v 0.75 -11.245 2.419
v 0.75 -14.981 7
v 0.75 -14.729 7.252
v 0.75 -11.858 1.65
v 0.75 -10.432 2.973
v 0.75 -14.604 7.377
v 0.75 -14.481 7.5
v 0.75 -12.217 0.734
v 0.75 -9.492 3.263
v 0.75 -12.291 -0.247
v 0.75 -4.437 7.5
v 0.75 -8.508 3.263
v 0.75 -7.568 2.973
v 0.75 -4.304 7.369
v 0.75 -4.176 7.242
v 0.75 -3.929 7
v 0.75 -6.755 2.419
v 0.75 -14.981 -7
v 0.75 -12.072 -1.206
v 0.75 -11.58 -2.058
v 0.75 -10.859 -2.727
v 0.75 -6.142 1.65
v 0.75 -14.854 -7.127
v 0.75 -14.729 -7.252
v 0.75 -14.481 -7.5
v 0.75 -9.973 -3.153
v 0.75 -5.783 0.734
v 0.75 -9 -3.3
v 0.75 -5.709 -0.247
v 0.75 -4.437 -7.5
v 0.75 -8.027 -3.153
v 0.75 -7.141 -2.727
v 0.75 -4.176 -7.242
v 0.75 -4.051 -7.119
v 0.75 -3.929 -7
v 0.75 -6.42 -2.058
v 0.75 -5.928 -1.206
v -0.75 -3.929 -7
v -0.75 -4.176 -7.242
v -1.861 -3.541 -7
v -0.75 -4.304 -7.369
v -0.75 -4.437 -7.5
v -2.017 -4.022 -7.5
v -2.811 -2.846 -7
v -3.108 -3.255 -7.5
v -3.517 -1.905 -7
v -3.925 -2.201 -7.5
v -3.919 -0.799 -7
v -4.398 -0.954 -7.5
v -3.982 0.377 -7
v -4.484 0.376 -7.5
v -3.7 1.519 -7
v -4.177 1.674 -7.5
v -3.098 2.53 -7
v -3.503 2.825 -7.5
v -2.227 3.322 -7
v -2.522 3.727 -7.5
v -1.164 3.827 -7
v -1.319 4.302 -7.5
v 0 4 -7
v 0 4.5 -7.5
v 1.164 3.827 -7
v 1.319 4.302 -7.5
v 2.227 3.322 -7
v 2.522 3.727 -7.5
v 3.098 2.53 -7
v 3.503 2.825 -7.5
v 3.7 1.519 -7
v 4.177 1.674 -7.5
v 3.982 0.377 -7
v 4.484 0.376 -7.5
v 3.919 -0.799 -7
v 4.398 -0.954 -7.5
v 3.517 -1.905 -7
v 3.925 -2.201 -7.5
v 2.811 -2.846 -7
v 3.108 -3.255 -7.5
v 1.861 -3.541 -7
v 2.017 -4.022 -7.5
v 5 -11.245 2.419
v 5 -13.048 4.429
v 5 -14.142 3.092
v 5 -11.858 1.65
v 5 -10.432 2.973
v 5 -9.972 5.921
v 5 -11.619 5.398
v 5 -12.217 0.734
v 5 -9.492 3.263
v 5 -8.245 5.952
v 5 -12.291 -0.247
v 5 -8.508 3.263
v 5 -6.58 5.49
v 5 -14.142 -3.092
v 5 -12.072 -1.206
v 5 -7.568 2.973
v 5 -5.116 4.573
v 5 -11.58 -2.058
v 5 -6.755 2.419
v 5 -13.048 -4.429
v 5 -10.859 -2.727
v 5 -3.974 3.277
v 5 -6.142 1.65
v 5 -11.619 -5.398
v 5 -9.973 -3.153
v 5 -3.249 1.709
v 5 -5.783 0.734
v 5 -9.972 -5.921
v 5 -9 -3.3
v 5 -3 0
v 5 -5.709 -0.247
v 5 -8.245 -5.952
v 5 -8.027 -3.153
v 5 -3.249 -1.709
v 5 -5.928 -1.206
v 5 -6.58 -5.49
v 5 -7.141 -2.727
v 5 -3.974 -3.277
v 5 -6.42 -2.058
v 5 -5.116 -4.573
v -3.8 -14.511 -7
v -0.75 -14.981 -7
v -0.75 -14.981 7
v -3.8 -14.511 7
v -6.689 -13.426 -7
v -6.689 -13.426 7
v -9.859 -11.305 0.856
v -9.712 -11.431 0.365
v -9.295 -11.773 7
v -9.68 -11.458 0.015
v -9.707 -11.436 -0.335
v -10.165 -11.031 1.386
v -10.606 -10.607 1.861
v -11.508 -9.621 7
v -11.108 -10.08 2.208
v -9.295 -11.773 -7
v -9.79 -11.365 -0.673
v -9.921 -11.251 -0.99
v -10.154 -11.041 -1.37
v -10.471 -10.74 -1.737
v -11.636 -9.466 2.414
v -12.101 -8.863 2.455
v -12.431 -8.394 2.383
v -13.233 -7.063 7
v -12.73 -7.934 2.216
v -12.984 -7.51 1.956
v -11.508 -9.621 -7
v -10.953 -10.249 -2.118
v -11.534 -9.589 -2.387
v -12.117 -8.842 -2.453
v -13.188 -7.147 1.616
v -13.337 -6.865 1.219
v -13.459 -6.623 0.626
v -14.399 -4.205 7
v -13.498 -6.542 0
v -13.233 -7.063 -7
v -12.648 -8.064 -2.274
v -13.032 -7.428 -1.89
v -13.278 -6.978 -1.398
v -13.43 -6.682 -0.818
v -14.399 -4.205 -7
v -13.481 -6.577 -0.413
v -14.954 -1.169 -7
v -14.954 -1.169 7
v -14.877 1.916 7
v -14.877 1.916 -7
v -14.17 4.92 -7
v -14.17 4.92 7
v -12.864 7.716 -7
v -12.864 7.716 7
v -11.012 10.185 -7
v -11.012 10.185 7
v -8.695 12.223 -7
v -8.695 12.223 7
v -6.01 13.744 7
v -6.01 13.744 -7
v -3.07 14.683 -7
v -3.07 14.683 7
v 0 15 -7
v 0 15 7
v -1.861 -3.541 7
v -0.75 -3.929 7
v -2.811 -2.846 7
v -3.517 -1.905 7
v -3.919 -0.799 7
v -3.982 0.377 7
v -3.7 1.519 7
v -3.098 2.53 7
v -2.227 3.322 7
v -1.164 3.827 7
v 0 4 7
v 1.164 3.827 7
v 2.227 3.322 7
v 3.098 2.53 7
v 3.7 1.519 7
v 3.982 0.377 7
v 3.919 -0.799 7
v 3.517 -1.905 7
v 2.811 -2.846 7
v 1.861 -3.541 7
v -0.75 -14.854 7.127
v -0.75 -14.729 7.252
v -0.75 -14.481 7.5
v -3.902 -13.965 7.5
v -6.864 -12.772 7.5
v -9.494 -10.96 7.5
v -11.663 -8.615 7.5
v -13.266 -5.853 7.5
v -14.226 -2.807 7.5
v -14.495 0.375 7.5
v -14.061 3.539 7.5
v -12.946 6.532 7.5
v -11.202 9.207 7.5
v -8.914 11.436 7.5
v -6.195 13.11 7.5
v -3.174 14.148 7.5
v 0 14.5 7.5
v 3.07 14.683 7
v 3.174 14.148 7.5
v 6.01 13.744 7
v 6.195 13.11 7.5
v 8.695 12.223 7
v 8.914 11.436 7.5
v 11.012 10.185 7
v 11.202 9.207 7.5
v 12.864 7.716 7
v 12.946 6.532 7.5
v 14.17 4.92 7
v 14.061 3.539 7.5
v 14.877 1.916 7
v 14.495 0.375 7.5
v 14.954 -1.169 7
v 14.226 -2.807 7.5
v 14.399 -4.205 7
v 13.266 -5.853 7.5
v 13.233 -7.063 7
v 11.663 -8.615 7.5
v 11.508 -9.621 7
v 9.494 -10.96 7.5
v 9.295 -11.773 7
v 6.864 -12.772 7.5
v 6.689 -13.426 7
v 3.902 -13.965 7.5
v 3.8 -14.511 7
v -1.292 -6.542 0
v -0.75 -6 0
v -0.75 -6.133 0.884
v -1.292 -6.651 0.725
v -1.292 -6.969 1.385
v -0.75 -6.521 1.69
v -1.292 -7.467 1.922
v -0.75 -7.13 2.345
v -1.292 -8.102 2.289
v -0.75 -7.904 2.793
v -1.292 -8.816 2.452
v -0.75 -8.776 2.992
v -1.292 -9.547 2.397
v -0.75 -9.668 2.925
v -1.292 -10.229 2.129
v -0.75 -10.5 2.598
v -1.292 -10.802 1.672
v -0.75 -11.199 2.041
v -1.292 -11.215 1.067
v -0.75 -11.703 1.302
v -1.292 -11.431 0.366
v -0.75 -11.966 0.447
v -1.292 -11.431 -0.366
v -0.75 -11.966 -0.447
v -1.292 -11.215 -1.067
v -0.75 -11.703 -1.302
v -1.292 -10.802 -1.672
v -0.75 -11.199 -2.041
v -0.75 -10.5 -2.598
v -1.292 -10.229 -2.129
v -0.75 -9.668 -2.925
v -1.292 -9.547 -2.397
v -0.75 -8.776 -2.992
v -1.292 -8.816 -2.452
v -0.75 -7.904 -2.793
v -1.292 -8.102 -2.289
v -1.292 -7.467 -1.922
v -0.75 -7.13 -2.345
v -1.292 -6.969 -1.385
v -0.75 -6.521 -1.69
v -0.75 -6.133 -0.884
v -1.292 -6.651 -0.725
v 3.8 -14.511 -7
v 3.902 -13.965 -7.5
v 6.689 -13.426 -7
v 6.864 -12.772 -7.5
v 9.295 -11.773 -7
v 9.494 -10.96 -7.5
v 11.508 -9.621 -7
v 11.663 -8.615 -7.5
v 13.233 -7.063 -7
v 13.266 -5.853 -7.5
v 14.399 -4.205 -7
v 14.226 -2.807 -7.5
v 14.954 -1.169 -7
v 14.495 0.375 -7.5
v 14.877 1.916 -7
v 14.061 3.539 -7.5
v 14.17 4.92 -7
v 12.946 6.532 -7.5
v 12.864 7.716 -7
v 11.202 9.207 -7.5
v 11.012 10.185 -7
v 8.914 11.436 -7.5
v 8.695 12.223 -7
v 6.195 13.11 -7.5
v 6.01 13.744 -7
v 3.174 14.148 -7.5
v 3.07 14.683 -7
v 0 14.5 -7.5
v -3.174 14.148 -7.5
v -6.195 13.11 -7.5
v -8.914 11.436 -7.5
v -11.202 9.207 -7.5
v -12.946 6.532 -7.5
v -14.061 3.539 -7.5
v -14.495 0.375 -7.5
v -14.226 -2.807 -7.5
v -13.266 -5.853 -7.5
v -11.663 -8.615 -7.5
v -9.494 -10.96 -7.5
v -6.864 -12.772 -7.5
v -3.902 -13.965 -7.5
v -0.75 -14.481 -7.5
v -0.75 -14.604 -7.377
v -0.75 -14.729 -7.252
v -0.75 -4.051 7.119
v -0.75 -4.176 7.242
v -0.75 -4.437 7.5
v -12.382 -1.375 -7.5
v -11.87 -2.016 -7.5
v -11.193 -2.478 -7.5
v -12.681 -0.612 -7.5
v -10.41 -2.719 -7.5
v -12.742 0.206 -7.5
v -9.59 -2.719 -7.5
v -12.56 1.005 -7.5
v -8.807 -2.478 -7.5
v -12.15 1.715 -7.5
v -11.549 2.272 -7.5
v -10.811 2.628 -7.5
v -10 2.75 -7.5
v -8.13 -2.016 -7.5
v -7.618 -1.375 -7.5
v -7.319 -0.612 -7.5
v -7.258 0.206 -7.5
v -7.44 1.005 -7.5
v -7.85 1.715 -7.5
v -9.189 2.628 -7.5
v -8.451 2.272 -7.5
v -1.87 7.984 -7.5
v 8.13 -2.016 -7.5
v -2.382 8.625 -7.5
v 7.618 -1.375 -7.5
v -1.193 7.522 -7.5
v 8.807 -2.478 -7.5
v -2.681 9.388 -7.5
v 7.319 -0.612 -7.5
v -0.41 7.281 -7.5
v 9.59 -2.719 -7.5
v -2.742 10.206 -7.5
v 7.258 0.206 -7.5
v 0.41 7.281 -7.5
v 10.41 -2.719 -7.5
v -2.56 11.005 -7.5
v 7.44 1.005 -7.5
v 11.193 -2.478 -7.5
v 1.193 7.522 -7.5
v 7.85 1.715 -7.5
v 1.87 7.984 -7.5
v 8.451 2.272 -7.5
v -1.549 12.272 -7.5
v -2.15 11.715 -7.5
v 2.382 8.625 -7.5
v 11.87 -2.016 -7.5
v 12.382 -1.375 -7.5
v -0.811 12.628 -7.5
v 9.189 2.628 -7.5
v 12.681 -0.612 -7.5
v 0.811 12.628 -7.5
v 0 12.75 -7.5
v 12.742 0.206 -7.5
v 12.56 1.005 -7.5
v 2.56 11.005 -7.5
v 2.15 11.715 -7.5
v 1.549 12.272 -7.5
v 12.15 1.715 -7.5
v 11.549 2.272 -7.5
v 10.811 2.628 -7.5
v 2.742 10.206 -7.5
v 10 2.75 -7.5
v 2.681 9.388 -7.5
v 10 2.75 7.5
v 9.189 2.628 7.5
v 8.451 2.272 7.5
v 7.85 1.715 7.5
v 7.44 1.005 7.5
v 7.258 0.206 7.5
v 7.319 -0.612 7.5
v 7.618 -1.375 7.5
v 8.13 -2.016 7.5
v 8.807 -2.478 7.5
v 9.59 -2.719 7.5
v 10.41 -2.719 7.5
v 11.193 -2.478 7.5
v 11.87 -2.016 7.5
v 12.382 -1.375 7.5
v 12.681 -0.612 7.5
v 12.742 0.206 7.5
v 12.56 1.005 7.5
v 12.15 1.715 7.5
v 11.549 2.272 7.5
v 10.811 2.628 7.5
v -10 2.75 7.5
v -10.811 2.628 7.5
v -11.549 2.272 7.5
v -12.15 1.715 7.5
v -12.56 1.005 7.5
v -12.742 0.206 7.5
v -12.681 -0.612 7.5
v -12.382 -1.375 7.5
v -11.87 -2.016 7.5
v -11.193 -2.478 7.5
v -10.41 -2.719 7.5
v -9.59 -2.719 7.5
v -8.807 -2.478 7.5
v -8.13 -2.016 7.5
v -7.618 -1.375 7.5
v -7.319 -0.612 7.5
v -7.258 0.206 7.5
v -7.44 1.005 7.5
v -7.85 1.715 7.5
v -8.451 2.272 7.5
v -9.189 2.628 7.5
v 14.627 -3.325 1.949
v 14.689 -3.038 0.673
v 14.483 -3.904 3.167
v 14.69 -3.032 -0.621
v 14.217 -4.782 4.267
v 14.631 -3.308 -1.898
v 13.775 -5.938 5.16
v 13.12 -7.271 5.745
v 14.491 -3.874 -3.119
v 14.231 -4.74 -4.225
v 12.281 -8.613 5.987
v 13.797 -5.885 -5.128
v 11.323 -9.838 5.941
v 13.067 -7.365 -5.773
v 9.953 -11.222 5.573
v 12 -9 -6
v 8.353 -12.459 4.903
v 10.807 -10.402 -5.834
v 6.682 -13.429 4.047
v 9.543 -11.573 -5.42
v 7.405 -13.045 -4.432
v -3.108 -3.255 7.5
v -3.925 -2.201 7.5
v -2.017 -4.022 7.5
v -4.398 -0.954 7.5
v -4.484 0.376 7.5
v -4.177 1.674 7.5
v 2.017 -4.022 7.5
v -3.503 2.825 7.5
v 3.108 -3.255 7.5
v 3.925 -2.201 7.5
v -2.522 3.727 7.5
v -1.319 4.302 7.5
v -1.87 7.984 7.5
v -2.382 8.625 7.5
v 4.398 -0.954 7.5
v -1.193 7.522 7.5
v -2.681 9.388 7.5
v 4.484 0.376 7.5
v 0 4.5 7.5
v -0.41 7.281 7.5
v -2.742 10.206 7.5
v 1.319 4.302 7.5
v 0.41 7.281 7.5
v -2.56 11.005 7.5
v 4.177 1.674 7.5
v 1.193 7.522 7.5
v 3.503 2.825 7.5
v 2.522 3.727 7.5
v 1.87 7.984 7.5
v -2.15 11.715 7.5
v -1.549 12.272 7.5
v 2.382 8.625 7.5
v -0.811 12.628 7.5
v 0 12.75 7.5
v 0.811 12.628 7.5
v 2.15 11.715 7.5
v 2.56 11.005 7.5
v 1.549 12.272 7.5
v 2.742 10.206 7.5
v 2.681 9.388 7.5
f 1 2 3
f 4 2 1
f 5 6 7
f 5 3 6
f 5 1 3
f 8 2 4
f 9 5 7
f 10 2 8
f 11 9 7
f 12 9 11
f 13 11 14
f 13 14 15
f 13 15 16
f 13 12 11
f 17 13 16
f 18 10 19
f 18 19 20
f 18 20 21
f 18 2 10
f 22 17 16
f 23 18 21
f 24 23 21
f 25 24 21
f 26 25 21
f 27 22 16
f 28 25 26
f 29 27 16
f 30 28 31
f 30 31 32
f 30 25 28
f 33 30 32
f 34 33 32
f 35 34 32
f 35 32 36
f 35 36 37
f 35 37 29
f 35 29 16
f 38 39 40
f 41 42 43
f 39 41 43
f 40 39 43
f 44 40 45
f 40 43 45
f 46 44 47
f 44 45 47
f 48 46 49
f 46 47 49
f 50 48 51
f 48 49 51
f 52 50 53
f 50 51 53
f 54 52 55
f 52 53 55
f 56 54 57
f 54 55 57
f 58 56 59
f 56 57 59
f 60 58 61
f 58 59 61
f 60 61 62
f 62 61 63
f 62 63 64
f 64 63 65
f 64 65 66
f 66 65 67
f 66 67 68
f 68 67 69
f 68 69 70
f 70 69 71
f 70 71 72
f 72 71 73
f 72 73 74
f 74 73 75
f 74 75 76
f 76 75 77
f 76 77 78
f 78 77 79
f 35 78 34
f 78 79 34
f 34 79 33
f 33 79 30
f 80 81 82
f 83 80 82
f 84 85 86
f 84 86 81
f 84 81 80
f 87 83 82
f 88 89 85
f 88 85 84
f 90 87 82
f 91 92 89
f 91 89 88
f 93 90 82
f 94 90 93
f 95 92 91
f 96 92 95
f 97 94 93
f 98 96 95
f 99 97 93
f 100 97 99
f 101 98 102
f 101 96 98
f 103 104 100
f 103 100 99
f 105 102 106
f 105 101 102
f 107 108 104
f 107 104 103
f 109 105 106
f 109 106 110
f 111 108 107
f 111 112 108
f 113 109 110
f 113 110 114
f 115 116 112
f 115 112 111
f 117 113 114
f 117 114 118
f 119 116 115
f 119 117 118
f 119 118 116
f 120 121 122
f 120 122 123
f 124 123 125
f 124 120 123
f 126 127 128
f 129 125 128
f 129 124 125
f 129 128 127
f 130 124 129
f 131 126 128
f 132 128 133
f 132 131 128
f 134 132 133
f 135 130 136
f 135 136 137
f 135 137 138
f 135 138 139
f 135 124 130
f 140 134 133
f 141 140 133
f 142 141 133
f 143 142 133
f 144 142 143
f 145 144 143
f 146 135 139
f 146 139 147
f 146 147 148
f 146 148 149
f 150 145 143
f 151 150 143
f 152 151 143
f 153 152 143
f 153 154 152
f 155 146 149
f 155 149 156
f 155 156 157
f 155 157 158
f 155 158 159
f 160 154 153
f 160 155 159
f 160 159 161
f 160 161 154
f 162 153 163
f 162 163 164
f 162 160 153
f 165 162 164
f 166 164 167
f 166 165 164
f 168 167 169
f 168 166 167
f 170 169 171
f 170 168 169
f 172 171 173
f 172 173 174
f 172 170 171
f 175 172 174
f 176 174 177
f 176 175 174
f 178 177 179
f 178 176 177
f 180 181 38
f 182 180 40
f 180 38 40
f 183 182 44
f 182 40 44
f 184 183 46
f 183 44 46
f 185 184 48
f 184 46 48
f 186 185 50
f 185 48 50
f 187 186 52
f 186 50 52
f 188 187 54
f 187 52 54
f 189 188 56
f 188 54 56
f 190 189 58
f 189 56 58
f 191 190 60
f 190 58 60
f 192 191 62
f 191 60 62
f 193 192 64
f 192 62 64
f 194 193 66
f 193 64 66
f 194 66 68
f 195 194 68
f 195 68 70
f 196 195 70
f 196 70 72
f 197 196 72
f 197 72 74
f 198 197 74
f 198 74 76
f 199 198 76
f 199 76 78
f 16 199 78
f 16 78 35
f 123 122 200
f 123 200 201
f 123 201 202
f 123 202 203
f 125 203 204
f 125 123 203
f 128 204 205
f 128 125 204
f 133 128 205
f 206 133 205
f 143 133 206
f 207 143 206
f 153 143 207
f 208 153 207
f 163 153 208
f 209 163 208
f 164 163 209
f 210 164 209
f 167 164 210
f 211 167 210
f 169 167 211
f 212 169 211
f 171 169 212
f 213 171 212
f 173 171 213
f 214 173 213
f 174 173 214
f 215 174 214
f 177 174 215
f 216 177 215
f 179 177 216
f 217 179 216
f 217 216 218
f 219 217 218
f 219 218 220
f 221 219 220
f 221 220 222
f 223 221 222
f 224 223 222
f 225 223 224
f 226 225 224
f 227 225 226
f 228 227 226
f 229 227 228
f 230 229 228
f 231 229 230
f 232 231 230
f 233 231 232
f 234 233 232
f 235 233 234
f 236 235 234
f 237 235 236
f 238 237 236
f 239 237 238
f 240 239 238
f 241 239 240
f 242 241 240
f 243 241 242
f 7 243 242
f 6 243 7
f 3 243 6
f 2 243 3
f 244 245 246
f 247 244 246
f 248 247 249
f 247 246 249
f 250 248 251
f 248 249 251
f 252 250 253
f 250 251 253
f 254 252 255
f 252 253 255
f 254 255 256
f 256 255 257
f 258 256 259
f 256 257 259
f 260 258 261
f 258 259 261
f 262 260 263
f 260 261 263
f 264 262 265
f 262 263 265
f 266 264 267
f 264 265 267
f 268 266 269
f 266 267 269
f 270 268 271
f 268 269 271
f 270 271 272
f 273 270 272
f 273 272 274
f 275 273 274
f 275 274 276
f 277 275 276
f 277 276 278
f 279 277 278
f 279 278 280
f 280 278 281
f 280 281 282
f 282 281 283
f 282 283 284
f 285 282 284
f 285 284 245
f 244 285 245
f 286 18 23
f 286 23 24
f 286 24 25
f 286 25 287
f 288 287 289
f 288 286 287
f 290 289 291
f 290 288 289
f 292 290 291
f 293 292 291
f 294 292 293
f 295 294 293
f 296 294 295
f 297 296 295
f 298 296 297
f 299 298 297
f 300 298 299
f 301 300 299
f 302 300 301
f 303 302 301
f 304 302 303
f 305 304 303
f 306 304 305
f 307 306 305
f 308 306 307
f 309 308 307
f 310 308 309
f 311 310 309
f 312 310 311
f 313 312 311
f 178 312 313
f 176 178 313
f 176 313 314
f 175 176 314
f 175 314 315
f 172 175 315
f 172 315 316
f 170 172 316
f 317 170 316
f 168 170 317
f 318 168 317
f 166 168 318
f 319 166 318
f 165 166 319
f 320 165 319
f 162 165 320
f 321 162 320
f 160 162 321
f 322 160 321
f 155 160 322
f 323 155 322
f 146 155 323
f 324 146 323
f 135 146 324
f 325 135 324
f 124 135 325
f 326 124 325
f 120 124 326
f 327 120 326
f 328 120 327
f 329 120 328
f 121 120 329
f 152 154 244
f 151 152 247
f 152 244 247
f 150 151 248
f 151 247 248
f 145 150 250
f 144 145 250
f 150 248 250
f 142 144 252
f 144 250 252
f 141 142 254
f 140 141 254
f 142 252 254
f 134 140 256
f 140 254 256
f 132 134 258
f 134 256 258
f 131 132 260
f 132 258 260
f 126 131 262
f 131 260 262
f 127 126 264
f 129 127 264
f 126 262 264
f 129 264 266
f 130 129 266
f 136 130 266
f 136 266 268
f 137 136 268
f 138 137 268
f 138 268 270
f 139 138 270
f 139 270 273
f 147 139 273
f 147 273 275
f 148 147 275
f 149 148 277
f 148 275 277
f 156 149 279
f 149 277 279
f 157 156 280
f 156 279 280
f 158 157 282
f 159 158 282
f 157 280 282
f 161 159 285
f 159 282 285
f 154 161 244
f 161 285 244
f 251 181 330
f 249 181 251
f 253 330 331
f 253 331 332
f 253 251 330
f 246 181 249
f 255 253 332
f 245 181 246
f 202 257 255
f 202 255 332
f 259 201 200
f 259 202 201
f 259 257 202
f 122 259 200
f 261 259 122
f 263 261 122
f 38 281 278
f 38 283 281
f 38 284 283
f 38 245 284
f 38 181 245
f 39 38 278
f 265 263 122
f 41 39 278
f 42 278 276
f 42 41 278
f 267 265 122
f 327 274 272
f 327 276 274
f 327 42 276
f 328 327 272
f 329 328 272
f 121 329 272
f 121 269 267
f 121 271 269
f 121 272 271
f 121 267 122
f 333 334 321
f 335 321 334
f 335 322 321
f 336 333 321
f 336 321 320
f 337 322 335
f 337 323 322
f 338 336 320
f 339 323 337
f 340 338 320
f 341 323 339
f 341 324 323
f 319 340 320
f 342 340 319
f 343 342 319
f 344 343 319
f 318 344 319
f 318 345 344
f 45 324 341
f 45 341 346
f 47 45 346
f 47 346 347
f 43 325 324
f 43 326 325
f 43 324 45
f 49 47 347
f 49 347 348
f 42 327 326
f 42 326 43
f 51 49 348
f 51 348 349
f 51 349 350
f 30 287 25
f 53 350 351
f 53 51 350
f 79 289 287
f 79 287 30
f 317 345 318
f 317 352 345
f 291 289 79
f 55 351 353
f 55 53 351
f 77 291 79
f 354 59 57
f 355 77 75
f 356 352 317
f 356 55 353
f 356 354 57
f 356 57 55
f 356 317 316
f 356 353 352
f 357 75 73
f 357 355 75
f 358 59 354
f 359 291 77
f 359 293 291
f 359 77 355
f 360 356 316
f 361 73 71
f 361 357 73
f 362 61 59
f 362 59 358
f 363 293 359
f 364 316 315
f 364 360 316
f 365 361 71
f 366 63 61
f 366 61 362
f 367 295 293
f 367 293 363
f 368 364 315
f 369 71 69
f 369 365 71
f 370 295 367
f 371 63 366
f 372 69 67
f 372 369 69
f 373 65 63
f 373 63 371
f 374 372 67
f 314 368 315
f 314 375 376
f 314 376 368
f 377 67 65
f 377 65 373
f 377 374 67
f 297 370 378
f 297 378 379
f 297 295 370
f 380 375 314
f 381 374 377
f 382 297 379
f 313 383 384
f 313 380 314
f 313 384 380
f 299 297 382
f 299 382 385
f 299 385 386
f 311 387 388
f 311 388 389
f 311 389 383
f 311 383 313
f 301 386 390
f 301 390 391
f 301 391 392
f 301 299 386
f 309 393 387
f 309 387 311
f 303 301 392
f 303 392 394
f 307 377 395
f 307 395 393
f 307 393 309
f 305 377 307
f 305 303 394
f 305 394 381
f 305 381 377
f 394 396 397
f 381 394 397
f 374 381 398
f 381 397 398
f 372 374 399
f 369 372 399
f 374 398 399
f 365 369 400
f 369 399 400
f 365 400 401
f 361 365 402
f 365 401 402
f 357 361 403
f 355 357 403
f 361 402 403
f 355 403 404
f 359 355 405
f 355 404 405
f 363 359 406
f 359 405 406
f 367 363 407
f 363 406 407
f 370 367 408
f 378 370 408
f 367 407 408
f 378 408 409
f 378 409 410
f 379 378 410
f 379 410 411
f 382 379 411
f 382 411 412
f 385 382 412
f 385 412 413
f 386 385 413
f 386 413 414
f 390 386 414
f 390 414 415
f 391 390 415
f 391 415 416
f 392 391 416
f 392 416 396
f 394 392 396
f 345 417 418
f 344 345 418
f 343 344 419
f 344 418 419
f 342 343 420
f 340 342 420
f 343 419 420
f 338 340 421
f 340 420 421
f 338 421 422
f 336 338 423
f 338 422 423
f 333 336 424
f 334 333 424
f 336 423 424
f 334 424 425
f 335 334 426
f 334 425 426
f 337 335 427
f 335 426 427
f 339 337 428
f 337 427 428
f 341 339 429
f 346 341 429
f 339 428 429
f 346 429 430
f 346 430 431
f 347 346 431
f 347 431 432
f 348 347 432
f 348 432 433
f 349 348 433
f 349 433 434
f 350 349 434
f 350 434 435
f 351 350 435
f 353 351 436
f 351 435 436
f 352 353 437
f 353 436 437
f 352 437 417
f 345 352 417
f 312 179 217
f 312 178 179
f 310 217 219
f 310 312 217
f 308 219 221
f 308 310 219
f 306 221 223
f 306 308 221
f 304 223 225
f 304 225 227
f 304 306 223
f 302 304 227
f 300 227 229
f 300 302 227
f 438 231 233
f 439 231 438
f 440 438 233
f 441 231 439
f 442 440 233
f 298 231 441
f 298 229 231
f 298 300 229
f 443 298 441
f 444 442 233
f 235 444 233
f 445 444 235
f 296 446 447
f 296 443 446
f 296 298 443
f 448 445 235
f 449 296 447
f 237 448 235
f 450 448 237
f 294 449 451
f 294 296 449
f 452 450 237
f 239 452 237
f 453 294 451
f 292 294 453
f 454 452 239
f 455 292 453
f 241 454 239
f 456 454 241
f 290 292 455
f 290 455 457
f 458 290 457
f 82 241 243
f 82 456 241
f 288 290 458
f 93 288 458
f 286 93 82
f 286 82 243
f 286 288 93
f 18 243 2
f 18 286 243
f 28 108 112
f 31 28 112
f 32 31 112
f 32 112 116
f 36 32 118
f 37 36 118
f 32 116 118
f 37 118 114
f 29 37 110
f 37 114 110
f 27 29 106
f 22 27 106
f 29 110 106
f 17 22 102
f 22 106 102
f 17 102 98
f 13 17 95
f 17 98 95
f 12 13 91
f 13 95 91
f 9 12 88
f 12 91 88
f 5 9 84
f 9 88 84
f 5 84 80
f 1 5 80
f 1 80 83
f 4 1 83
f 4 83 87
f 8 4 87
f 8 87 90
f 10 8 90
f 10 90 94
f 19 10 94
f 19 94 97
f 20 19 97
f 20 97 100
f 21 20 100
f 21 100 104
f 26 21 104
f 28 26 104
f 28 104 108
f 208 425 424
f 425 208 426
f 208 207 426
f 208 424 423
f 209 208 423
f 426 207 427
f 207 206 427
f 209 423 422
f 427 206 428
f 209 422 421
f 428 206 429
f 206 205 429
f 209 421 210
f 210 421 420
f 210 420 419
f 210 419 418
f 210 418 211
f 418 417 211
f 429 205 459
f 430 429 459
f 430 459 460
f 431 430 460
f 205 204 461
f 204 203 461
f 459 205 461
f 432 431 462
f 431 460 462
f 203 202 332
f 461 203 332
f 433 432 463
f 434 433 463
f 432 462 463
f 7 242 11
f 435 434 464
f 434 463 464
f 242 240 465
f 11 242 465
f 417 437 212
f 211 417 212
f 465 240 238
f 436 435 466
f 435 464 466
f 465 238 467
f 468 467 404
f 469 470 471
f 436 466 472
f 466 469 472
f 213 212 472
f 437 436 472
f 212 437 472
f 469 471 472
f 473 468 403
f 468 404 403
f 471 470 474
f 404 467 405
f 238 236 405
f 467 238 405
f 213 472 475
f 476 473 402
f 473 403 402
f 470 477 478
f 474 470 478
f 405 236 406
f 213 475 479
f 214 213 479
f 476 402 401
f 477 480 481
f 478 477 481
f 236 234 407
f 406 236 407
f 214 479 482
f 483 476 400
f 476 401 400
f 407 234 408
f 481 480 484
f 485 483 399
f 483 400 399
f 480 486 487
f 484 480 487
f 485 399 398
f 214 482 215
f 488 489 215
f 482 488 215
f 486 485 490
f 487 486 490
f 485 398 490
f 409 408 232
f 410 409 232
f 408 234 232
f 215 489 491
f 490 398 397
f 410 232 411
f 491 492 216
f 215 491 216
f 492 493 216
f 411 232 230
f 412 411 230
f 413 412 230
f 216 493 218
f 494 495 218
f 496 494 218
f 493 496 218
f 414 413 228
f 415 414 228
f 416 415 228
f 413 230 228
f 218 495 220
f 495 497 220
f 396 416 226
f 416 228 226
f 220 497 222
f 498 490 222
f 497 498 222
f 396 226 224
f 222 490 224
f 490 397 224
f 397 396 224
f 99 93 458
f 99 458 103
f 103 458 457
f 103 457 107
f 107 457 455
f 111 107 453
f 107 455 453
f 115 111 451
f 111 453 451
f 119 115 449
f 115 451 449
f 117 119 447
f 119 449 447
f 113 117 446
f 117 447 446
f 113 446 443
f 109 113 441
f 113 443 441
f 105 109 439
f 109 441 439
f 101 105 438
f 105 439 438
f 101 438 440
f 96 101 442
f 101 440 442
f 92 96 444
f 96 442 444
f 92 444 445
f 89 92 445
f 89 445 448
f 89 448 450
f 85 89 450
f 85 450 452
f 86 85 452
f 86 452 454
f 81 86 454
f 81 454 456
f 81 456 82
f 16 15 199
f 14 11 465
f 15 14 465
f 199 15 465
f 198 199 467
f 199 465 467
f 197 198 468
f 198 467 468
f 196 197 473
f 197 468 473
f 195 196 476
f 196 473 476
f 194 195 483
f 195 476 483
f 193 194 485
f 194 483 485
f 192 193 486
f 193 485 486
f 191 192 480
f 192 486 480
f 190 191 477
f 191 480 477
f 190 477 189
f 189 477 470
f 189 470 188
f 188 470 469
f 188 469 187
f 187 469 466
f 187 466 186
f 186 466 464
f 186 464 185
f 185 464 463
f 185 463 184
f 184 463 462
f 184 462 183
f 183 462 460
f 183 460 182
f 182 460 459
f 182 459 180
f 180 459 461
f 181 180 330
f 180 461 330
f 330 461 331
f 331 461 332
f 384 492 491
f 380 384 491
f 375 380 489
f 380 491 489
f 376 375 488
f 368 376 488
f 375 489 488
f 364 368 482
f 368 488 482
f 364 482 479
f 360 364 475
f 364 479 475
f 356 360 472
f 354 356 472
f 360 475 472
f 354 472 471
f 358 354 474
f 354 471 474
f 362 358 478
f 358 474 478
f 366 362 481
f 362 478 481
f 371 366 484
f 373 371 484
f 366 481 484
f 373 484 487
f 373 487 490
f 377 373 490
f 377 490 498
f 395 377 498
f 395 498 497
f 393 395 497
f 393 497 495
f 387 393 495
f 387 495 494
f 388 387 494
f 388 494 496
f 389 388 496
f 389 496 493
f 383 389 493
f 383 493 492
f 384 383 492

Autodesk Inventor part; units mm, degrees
sketch "Sketch_14" plane through (0, 0, 0) normal (1, 0, 0) x (0, 1, 0)
  line L0 (0, -7.5) -> (0, 7.5)
  line L1 (0, 7.5) -> (14.5, 7.5)
  line L2 (14.5, 7.5) -> (15, 7)
  line L3 (15, 7) -> (15, -7)
  line L4 (15, -7) -> (14.5, -7.5)
  line L5 (14.5, -7.5) -> (0, -7.5)
  line L6 (0, -7.5) -> (0, 7.5)
revolve "Revolution1" add sketch "Sketch_14" angle 360 about axis through (0, 0, -7.5) along (0, 0, -1)
sketch "Sketch_15" plane through (0, 0, 0) normal (1, 0, 0) x (0, 1, 0)
  line L0 (0, -7.5) -> (0, 7.5)
  line L1 (0, 7.5) -> (4.5, 7.5)
  line L2 (4.5, 7.5) -> (4, 7)
  line L3 (4, 7) -> (4, -7)
  line L4 (4, -7) -> (4.5, -7.5)
  line L5 (4.5, -7.5) -> (0, -7.5)
  line L6 (0, -7.5) -> (0, 7.5)
revolve "Revolution2" cut sketch "Sketch_15" angle 360 about axis through (0, 0, -7.5) along (0, 0, -1)
sketch "Sketch_16" plane through (0, 0, 0) normal (0, 0, 1) x (1, 0, 0)
  arc A0 (-0.75, -15.9824) -> (0.75, -15.9824) centre (0, 0) ccw
  line L0 (0.75, -15.9824) -> (0.75, 0)
  line L1 (0.75, 0) -> (-0.75, 0)
  line L2 (-0.75, 0) -> (-0.75, -15.9824)
extrude "Extrusion1" cut sketch "Sketch_16" along normal mid plane 15
sketch "Sketch4" plane through (0, 0, -7.5) normal (0, 0, -1) x (-1, 0, 0)
  point P0 (-10, 0)
hole "Hole1" at (10, 0, -7.5) direction (0, 0, 1) diameter 5.5 depth 15
sketch "Sketch5" plane through (0, 0, -7.5) normal (0, 0, -1) x (-1, 0, 0)
  point P0 (10, 0)
hole "Hole2" at (-10, 0, -7.5) direction (0, 0, 1) diameter 5.5 depth 15
sketch "Sketch6" plane through (0, 0, -7.5) normal (0, 0, -1) x (-1, 0, 0)
  point P0 (0, 10)
hole "Hole3" at (0, 10, -7.5) direction (0, 0, 1) diameter 5.5 depth 15
sketch "Sketch_23" plane through (0, -9, 0) normal (0, 1, 0) x (1, 0, 0)
  line L0 (15, 0) -> (0, 0)
  line L1 (0, 0) -> (0, 3.3)
  line L2 (0, 3.3) -> (5, 3.3)
  line L3 (5, 3.3) -> (5, 6)
  line L4 (5, 6) -> (15, 6)
  line L5 (15, 6) -> (15, 0)
  line L6 (15, 0) -> (0, 0)
revolve "Revolution3" cut sketch "Sketch_23" angle 360 about axis through (15, -9, 0) along (1, 0, 0)
sketch "Sketch_25" plane through (0, 0, 0) normal (0, 0, 1) x (1, 0, 0)
  line L0 (-0.75, -9) -> (-13.7477, -9)
  line L1 (-13.7477, -9) -> (-13.7477, -6.5415)
  line L2 (-13.7477, -6.5415) -> (-1.2915, -6.5415)
  line L3 (-1.2915, -6.5415) -> (-0.75, -6)
  line L4 (-0.75, -6) -> (-0.75, -9)
  line L5 (-0.75, -9) -> (-13.7477, -9)
revolve "Revolution4" cut sketch "Sketch_25" angle 360 about axis through (-0.75, -9, 0) along (1, 0, 0)
thread "Thread1" size "M6x1" class "6H" standard "ISO Metric profile" length 12.4562
ref_plane "to_bolt_XY" through (5, -9, 0) normal (1, 0, 0) x (0, 0, -1)
ref_plane "to_bolt_YZ" through (5, -9, 0) normal (0, 0, -1) x (0, 1, 0)
ref_plane "to_bolt_ZX" through (5, -9, 0) normal (0, 1, 0) x (1, 0, 0)
properties part number "SCST8-15b"
